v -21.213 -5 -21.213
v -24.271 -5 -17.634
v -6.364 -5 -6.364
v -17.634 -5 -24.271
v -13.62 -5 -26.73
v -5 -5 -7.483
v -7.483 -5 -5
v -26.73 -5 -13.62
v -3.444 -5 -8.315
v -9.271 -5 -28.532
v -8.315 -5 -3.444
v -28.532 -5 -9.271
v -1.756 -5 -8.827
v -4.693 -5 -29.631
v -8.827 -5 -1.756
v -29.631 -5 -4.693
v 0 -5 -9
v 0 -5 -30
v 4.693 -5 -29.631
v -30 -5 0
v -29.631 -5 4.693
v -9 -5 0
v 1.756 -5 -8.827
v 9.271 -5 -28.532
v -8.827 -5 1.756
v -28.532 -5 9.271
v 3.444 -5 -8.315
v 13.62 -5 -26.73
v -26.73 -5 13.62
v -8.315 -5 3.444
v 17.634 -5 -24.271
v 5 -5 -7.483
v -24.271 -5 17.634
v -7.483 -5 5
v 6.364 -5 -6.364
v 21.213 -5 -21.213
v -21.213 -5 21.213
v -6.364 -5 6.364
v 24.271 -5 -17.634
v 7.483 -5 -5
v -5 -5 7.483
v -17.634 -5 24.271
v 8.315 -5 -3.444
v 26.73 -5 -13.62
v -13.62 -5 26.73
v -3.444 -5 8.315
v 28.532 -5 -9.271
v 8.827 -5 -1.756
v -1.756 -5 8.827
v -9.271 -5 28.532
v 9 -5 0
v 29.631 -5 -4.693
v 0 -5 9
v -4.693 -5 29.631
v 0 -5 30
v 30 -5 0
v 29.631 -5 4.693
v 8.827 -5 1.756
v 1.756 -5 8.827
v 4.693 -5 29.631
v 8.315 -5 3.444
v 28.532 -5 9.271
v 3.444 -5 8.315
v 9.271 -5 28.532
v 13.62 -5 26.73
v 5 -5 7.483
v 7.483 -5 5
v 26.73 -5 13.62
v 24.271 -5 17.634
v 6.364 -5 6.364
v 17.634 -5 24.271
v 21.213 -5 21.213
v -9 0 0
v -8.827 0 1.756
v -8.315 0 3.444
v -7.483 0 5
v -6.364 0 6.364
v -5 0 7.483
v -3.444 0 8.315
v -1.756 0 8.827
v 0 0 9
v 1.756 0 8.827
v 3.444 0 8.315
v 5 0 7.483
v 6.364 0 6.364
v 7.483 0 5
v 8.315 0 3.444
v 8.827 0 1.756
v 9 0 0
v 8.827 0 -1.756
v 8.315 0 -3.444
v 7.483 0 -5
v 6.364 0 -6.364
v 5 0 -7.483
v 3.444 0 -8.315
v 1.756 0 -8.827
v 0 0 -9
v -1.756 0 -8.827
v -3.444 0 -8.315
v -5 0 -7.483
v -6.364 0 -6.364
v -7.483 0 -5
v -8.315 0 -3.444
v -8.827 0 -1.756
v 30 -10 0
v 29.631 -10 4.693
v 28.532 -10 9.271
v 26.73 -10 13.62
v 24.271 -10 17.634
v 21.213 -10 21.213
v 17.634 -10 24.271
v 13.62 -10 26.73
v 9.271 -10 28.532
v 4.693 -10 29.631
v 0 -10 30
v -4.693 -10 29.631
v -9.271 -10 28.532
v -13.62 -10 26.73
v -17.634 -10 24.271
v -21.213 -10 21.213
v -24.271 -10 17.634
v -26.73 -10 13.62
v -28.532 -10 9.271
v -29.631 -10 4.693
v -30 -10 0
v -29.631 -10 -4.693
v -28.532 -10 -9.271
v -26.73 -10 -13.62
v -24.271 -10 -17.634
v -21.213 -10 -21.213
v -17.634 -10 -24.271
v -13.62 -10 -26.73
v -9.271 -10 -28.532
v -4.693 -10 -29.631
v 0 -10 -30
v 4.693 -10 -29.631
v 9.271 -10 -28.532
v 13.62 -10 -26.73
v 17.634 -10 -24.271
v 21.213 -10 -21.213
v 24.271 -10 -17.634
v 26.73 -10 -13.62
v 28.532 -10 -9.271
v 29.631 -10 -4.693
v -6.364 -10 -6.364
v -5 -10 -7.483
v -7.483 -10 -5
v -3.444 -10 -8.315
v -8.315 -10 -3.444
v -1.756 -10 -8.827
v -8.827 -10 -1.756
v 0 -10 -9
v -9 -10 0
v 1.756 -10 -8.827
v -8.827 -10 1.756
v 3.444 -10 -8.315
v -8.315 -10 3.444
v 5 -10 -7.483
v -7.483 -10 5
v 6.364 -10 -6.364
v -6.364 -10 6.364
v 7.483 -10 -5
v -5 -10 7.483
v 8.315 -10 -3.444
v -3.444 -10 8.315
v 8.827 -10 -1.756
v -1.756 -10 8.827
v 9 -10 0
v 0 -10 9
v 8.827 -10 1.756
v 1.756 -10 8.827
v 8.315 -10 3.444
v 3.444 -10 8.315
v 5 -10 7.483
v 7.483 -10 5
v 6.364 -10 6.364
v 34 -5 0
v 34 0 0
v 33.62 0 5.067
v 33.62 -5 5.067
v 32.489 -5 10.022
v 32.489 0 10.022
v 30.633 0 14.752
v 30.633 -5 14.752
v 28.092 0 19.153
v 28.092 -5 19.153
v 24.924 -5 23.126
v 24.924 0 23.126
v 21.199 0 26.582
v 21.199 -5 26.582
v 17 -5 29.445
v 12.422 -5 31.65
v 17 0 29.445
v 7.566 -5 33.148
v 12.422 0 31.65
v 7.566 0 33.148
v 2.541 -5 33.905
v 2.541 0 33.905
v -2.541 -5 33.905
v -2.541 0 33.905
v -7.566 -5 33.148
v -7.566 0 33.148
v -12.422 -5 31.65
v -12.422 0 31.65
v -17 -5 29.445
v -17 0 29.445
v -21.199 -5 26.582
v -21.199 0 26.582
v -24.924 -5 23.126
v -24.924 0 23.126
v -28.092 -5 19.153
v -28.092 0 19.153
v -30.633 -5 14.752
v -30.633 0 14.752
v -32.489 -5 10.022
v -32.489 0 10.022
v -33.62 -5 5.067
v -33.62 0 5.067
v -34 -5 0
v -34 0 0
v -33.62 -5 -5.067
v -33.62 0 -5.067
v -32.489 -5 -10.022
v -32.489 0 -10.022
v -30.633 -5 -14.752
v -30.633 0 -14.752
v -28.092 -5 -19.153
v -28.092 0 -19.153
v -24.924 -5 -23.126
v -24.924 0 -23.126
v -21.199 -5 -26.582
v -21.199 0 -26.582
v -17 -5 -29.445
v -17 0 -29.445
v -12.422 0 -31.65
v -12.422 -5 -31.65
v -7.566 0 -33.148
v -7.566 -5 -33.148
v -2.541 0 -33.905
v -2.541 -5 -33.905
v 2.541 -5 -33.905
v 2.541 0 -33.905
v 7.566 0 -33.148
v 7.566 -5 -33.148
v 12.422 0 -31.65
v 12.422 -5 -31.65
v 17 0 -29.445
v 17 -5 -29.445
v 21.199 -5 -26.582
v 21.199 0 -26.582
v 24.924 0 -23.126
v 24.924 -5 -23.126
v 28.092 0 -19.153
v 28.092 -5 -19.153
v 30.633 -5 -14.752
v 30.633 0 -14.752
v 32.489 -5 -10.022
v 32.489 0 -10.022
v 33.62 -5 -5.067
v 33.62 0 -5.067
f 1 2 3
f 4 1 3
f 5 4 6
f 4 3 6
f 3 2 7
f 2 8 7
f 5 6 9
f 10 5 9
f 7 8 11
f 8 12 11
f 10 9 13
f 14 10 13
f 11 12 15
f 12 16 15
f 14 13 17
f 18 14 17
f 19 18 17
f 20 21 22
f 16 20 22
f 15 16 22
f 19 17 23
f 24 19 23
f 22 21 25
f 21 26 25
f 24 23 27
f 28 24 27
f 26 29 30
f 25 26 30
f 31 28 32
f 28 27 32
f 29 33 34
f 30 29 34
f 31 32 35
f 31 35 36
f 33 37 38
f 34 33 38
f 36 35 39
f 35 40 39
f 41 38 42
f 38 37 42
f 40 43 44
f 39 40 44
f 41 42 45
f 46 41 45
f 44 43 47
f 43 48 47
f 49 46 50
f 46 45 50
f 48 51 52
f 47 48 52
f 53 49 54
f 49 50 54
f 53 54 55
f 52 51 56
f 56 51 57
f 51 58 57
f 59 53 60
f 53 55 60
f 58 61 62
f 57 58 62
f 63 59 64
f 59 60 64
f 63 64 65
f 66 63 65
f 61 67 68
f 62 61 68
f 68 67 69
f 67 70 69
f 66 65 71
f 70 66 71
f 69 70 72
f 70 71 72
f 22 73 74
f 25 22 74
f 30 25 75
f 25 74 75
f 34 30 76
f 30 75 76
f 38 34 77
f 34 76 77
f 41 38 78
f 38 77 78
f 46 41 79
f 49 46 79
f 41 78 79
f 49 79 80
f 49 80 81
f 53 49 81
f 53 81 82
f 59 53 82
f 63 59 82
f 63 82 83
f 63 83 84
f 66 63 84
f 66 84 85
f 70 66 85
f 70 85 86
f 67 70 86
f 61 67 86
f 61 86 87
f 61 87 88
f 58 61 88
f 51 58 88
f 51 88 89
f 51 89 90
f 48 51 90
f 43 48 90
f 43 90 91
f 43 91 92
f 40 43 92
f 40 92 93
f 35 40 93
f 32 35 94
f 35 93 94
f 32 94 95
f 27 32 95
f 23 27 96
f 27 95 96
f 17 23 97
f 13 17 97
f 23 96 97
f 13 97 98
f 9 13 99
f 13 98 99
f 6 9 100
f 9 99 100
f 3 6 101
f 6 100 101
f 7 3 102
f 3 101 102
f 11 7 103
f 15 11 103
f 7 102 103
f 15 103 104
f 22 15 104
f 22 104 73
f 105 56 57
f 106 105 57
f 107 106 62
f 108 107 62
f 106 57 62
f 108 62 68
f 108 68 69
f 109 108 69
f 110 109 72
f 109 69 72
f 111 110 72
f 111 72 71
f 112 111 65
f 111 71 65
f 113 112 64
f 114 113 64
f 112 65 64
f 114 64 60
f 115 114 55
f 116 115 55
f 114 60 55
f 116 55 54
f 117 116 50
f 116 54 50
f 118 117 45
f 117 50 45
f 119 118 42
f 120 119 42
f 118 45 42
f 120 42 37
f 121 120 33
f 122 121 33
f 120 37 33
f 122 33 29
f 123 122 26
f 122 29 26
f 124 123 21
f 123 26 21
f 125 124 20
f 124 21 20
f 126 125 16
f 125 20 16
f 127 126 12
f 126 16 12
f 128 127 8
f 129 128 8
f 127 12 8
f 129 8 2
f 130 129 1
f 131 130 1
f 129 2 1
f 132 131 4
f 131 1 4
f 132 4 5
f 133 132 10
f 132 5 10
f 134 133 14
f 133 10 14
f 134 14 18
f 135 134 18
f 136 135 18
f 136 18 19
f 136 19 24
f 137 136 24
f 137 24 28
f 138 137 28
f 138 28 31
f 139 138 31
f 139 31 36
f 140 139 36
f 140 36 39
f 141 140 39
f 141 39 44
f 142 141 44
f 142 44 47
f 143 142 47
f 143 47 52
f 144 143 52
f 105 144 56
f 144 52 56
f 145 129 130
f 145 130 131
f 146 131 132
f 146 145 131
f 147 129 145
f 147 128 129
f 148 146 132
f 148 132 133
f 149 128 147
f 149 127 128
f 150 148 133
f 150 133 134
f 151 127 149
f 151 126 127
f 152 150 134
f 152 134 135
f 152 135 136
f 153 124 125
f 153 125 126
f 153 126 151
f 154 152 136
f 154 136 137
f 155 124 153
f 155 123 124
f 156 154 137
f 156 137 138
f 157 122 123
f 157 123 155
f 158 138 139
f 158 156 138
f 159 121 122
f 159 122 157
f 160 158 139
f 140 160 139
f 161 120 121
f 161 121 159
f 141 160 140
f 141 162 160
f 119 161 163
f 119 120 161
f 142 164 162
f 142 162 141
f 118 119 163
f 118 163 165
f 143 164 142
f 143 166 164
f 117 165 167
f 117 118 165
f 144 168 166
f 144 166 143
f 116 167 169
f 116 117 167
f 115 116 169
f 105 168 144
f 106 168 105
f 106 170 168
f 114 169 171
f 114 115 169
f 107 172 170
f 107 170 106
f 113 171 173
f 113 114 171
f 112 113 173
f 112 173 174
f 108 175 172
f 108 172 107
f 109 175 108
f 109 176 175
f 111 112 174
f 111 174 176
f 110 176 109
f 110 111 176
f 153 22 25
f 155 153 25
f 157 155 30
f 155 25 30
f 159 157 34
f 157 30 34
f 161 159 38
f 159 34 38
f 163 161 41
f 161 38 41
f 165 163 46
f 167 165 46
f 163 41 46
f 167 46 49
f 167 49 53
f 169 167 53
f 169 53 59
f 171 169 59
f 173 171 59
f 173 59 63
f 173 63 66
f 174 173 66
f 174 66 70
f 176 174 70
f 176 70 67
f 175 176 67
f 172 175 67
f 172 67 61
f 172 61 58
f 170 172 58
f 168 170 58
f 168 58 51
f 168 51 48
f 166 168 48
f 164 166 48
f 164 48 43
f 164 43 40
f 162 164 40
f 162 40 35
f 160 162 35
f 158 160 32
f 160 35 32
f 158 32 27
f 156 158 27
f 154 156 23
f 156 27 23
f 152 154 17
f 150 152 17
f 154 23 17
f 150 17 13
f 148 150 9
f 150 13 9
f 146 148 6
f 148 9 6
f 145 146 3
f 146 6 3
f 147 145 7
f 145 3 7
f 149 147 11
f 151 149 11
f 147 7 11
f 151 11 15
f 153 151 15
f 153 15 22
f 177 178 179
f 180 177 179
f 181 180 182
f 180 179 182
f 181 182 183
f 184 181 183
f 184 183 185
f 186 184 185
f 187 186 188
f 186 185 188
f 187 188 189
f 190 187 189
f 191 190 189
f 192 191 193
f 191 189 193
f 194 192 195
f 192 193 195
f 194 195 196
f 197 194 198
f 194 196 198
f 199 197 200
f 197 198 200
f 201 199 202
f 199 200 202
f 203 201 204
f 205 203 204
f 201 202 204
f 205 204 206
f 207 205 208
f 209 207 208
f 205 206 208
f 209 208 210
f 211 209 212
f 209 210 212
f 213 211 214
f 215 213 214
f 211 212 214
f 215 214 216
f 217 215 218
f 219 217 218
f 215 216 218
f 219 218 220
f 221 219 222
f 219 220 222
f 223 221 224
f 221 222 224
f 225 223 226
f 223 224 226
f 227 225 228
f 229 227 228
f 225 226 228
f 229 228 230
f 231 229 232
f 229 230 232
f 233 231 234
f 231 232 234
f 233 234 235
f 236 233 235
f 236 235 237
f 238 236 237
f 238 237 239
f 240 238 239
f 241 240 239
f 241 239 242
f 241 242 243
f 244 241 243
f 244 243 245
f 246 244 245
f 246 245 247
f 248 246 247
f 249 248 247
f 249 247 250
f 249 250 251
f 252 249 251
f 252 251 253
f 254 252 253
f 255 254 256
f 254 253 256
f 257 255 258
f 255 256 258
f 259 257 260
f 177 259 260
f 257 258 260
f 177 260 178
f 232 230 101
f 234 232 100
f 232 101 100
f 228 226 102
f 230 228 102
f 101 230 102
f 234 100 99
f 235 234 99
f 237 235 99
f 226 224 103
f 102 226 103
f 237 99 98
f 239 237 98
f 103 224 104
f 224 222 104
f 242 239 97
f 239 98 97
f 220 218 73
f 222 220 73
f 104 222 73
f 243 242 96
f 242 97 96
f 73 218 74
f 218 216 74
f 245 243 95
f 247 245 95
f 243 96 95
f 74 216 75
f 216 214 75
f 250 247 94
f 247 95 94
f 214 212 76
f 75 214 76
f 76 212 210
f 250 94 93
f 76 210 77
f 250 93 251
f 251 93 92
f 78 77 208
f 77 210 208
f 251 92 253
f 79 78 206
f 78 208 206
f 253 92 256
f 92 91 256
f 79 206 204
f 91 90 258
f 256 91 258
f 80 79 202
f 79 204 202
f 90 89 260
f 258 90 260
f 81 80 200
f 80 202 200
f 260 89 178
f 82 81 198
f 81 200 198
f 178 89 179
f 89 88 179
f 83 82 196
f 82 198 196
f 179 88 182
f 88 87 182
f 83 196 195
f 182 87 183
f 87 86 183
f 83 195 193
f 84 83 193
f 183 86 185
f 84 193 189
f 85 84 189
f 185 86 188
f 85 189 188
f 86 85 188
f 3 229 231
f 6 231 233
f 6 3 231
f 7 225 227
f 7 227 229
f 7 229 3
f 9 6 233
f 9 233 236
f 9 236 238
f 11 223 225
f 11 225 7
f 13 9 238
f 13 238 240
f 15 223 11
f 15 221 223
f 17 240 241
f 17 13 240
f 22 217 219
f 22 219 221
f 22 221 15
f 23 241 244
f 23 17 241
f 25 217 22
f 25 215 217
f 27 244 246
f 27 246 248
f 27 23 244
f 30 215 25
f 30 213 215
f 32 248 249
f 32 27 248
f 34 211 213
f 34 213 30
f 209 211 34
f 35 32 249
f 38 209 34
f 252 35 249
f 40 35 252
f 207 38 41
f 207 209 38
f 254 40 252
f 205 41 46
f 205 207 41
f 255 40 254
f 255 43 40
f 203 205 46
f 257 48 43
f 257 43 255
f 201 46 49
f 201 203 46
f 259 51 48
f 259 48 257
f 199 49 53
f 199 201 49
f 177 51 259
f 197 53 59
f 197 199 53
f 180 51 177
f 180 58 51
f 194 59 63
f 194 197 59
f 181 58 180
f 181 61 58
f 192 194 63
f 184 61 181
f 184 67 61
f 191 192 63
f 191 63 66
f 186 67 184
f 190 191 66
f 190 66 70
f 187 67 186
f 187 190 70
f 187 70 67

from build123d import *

# Parameters (mm, degrees)
F0_R     = 34
F1_DEPTH = 5
F3_R     = 30
F4_DEPTH = 5
F5_R     = 9
F6_DEPTH = 56.2
F7_R     = 9
F8_DEPTH = 25


with BuildPart() as f1:
    # F0 (on Front) → F1 (new body)
    with BuildSketch(Plane.XZ):
        Circle(F0_R)
    extrude(amount=F1_DEPTH)

    # F7 (on face) → F8 (cut)
    with BuildSketch(Plane(origin=(0, 0, 0), x_dir=(-1, 0, 0), z_dir=(0, 1, 0))):
        Circle(F7_R)
    extrude(amount=-F8_DEPTH, mode=Mode.SUBTRACT)


with BuildPart() as f4:
    # F3 (on offset) → F4 (new body)
    with BuildSketch(Plane.XZ.offset(5)):
        Circle(F3_R)
    extrude(amount=F4_DEPTH)

    # F5 (on face) → F6 (cut)
    with BuildSketch(Plane(origin=(0, -5, 0), x_dir=(-1, 0, 0), z_dir=(0, 1, 0))):
        Circle(F5_R)
    extrude(amount=-F6_DEPTH, mode=Mode.SUBTRACT)


solid = Compound([f1.part, f4.part])
